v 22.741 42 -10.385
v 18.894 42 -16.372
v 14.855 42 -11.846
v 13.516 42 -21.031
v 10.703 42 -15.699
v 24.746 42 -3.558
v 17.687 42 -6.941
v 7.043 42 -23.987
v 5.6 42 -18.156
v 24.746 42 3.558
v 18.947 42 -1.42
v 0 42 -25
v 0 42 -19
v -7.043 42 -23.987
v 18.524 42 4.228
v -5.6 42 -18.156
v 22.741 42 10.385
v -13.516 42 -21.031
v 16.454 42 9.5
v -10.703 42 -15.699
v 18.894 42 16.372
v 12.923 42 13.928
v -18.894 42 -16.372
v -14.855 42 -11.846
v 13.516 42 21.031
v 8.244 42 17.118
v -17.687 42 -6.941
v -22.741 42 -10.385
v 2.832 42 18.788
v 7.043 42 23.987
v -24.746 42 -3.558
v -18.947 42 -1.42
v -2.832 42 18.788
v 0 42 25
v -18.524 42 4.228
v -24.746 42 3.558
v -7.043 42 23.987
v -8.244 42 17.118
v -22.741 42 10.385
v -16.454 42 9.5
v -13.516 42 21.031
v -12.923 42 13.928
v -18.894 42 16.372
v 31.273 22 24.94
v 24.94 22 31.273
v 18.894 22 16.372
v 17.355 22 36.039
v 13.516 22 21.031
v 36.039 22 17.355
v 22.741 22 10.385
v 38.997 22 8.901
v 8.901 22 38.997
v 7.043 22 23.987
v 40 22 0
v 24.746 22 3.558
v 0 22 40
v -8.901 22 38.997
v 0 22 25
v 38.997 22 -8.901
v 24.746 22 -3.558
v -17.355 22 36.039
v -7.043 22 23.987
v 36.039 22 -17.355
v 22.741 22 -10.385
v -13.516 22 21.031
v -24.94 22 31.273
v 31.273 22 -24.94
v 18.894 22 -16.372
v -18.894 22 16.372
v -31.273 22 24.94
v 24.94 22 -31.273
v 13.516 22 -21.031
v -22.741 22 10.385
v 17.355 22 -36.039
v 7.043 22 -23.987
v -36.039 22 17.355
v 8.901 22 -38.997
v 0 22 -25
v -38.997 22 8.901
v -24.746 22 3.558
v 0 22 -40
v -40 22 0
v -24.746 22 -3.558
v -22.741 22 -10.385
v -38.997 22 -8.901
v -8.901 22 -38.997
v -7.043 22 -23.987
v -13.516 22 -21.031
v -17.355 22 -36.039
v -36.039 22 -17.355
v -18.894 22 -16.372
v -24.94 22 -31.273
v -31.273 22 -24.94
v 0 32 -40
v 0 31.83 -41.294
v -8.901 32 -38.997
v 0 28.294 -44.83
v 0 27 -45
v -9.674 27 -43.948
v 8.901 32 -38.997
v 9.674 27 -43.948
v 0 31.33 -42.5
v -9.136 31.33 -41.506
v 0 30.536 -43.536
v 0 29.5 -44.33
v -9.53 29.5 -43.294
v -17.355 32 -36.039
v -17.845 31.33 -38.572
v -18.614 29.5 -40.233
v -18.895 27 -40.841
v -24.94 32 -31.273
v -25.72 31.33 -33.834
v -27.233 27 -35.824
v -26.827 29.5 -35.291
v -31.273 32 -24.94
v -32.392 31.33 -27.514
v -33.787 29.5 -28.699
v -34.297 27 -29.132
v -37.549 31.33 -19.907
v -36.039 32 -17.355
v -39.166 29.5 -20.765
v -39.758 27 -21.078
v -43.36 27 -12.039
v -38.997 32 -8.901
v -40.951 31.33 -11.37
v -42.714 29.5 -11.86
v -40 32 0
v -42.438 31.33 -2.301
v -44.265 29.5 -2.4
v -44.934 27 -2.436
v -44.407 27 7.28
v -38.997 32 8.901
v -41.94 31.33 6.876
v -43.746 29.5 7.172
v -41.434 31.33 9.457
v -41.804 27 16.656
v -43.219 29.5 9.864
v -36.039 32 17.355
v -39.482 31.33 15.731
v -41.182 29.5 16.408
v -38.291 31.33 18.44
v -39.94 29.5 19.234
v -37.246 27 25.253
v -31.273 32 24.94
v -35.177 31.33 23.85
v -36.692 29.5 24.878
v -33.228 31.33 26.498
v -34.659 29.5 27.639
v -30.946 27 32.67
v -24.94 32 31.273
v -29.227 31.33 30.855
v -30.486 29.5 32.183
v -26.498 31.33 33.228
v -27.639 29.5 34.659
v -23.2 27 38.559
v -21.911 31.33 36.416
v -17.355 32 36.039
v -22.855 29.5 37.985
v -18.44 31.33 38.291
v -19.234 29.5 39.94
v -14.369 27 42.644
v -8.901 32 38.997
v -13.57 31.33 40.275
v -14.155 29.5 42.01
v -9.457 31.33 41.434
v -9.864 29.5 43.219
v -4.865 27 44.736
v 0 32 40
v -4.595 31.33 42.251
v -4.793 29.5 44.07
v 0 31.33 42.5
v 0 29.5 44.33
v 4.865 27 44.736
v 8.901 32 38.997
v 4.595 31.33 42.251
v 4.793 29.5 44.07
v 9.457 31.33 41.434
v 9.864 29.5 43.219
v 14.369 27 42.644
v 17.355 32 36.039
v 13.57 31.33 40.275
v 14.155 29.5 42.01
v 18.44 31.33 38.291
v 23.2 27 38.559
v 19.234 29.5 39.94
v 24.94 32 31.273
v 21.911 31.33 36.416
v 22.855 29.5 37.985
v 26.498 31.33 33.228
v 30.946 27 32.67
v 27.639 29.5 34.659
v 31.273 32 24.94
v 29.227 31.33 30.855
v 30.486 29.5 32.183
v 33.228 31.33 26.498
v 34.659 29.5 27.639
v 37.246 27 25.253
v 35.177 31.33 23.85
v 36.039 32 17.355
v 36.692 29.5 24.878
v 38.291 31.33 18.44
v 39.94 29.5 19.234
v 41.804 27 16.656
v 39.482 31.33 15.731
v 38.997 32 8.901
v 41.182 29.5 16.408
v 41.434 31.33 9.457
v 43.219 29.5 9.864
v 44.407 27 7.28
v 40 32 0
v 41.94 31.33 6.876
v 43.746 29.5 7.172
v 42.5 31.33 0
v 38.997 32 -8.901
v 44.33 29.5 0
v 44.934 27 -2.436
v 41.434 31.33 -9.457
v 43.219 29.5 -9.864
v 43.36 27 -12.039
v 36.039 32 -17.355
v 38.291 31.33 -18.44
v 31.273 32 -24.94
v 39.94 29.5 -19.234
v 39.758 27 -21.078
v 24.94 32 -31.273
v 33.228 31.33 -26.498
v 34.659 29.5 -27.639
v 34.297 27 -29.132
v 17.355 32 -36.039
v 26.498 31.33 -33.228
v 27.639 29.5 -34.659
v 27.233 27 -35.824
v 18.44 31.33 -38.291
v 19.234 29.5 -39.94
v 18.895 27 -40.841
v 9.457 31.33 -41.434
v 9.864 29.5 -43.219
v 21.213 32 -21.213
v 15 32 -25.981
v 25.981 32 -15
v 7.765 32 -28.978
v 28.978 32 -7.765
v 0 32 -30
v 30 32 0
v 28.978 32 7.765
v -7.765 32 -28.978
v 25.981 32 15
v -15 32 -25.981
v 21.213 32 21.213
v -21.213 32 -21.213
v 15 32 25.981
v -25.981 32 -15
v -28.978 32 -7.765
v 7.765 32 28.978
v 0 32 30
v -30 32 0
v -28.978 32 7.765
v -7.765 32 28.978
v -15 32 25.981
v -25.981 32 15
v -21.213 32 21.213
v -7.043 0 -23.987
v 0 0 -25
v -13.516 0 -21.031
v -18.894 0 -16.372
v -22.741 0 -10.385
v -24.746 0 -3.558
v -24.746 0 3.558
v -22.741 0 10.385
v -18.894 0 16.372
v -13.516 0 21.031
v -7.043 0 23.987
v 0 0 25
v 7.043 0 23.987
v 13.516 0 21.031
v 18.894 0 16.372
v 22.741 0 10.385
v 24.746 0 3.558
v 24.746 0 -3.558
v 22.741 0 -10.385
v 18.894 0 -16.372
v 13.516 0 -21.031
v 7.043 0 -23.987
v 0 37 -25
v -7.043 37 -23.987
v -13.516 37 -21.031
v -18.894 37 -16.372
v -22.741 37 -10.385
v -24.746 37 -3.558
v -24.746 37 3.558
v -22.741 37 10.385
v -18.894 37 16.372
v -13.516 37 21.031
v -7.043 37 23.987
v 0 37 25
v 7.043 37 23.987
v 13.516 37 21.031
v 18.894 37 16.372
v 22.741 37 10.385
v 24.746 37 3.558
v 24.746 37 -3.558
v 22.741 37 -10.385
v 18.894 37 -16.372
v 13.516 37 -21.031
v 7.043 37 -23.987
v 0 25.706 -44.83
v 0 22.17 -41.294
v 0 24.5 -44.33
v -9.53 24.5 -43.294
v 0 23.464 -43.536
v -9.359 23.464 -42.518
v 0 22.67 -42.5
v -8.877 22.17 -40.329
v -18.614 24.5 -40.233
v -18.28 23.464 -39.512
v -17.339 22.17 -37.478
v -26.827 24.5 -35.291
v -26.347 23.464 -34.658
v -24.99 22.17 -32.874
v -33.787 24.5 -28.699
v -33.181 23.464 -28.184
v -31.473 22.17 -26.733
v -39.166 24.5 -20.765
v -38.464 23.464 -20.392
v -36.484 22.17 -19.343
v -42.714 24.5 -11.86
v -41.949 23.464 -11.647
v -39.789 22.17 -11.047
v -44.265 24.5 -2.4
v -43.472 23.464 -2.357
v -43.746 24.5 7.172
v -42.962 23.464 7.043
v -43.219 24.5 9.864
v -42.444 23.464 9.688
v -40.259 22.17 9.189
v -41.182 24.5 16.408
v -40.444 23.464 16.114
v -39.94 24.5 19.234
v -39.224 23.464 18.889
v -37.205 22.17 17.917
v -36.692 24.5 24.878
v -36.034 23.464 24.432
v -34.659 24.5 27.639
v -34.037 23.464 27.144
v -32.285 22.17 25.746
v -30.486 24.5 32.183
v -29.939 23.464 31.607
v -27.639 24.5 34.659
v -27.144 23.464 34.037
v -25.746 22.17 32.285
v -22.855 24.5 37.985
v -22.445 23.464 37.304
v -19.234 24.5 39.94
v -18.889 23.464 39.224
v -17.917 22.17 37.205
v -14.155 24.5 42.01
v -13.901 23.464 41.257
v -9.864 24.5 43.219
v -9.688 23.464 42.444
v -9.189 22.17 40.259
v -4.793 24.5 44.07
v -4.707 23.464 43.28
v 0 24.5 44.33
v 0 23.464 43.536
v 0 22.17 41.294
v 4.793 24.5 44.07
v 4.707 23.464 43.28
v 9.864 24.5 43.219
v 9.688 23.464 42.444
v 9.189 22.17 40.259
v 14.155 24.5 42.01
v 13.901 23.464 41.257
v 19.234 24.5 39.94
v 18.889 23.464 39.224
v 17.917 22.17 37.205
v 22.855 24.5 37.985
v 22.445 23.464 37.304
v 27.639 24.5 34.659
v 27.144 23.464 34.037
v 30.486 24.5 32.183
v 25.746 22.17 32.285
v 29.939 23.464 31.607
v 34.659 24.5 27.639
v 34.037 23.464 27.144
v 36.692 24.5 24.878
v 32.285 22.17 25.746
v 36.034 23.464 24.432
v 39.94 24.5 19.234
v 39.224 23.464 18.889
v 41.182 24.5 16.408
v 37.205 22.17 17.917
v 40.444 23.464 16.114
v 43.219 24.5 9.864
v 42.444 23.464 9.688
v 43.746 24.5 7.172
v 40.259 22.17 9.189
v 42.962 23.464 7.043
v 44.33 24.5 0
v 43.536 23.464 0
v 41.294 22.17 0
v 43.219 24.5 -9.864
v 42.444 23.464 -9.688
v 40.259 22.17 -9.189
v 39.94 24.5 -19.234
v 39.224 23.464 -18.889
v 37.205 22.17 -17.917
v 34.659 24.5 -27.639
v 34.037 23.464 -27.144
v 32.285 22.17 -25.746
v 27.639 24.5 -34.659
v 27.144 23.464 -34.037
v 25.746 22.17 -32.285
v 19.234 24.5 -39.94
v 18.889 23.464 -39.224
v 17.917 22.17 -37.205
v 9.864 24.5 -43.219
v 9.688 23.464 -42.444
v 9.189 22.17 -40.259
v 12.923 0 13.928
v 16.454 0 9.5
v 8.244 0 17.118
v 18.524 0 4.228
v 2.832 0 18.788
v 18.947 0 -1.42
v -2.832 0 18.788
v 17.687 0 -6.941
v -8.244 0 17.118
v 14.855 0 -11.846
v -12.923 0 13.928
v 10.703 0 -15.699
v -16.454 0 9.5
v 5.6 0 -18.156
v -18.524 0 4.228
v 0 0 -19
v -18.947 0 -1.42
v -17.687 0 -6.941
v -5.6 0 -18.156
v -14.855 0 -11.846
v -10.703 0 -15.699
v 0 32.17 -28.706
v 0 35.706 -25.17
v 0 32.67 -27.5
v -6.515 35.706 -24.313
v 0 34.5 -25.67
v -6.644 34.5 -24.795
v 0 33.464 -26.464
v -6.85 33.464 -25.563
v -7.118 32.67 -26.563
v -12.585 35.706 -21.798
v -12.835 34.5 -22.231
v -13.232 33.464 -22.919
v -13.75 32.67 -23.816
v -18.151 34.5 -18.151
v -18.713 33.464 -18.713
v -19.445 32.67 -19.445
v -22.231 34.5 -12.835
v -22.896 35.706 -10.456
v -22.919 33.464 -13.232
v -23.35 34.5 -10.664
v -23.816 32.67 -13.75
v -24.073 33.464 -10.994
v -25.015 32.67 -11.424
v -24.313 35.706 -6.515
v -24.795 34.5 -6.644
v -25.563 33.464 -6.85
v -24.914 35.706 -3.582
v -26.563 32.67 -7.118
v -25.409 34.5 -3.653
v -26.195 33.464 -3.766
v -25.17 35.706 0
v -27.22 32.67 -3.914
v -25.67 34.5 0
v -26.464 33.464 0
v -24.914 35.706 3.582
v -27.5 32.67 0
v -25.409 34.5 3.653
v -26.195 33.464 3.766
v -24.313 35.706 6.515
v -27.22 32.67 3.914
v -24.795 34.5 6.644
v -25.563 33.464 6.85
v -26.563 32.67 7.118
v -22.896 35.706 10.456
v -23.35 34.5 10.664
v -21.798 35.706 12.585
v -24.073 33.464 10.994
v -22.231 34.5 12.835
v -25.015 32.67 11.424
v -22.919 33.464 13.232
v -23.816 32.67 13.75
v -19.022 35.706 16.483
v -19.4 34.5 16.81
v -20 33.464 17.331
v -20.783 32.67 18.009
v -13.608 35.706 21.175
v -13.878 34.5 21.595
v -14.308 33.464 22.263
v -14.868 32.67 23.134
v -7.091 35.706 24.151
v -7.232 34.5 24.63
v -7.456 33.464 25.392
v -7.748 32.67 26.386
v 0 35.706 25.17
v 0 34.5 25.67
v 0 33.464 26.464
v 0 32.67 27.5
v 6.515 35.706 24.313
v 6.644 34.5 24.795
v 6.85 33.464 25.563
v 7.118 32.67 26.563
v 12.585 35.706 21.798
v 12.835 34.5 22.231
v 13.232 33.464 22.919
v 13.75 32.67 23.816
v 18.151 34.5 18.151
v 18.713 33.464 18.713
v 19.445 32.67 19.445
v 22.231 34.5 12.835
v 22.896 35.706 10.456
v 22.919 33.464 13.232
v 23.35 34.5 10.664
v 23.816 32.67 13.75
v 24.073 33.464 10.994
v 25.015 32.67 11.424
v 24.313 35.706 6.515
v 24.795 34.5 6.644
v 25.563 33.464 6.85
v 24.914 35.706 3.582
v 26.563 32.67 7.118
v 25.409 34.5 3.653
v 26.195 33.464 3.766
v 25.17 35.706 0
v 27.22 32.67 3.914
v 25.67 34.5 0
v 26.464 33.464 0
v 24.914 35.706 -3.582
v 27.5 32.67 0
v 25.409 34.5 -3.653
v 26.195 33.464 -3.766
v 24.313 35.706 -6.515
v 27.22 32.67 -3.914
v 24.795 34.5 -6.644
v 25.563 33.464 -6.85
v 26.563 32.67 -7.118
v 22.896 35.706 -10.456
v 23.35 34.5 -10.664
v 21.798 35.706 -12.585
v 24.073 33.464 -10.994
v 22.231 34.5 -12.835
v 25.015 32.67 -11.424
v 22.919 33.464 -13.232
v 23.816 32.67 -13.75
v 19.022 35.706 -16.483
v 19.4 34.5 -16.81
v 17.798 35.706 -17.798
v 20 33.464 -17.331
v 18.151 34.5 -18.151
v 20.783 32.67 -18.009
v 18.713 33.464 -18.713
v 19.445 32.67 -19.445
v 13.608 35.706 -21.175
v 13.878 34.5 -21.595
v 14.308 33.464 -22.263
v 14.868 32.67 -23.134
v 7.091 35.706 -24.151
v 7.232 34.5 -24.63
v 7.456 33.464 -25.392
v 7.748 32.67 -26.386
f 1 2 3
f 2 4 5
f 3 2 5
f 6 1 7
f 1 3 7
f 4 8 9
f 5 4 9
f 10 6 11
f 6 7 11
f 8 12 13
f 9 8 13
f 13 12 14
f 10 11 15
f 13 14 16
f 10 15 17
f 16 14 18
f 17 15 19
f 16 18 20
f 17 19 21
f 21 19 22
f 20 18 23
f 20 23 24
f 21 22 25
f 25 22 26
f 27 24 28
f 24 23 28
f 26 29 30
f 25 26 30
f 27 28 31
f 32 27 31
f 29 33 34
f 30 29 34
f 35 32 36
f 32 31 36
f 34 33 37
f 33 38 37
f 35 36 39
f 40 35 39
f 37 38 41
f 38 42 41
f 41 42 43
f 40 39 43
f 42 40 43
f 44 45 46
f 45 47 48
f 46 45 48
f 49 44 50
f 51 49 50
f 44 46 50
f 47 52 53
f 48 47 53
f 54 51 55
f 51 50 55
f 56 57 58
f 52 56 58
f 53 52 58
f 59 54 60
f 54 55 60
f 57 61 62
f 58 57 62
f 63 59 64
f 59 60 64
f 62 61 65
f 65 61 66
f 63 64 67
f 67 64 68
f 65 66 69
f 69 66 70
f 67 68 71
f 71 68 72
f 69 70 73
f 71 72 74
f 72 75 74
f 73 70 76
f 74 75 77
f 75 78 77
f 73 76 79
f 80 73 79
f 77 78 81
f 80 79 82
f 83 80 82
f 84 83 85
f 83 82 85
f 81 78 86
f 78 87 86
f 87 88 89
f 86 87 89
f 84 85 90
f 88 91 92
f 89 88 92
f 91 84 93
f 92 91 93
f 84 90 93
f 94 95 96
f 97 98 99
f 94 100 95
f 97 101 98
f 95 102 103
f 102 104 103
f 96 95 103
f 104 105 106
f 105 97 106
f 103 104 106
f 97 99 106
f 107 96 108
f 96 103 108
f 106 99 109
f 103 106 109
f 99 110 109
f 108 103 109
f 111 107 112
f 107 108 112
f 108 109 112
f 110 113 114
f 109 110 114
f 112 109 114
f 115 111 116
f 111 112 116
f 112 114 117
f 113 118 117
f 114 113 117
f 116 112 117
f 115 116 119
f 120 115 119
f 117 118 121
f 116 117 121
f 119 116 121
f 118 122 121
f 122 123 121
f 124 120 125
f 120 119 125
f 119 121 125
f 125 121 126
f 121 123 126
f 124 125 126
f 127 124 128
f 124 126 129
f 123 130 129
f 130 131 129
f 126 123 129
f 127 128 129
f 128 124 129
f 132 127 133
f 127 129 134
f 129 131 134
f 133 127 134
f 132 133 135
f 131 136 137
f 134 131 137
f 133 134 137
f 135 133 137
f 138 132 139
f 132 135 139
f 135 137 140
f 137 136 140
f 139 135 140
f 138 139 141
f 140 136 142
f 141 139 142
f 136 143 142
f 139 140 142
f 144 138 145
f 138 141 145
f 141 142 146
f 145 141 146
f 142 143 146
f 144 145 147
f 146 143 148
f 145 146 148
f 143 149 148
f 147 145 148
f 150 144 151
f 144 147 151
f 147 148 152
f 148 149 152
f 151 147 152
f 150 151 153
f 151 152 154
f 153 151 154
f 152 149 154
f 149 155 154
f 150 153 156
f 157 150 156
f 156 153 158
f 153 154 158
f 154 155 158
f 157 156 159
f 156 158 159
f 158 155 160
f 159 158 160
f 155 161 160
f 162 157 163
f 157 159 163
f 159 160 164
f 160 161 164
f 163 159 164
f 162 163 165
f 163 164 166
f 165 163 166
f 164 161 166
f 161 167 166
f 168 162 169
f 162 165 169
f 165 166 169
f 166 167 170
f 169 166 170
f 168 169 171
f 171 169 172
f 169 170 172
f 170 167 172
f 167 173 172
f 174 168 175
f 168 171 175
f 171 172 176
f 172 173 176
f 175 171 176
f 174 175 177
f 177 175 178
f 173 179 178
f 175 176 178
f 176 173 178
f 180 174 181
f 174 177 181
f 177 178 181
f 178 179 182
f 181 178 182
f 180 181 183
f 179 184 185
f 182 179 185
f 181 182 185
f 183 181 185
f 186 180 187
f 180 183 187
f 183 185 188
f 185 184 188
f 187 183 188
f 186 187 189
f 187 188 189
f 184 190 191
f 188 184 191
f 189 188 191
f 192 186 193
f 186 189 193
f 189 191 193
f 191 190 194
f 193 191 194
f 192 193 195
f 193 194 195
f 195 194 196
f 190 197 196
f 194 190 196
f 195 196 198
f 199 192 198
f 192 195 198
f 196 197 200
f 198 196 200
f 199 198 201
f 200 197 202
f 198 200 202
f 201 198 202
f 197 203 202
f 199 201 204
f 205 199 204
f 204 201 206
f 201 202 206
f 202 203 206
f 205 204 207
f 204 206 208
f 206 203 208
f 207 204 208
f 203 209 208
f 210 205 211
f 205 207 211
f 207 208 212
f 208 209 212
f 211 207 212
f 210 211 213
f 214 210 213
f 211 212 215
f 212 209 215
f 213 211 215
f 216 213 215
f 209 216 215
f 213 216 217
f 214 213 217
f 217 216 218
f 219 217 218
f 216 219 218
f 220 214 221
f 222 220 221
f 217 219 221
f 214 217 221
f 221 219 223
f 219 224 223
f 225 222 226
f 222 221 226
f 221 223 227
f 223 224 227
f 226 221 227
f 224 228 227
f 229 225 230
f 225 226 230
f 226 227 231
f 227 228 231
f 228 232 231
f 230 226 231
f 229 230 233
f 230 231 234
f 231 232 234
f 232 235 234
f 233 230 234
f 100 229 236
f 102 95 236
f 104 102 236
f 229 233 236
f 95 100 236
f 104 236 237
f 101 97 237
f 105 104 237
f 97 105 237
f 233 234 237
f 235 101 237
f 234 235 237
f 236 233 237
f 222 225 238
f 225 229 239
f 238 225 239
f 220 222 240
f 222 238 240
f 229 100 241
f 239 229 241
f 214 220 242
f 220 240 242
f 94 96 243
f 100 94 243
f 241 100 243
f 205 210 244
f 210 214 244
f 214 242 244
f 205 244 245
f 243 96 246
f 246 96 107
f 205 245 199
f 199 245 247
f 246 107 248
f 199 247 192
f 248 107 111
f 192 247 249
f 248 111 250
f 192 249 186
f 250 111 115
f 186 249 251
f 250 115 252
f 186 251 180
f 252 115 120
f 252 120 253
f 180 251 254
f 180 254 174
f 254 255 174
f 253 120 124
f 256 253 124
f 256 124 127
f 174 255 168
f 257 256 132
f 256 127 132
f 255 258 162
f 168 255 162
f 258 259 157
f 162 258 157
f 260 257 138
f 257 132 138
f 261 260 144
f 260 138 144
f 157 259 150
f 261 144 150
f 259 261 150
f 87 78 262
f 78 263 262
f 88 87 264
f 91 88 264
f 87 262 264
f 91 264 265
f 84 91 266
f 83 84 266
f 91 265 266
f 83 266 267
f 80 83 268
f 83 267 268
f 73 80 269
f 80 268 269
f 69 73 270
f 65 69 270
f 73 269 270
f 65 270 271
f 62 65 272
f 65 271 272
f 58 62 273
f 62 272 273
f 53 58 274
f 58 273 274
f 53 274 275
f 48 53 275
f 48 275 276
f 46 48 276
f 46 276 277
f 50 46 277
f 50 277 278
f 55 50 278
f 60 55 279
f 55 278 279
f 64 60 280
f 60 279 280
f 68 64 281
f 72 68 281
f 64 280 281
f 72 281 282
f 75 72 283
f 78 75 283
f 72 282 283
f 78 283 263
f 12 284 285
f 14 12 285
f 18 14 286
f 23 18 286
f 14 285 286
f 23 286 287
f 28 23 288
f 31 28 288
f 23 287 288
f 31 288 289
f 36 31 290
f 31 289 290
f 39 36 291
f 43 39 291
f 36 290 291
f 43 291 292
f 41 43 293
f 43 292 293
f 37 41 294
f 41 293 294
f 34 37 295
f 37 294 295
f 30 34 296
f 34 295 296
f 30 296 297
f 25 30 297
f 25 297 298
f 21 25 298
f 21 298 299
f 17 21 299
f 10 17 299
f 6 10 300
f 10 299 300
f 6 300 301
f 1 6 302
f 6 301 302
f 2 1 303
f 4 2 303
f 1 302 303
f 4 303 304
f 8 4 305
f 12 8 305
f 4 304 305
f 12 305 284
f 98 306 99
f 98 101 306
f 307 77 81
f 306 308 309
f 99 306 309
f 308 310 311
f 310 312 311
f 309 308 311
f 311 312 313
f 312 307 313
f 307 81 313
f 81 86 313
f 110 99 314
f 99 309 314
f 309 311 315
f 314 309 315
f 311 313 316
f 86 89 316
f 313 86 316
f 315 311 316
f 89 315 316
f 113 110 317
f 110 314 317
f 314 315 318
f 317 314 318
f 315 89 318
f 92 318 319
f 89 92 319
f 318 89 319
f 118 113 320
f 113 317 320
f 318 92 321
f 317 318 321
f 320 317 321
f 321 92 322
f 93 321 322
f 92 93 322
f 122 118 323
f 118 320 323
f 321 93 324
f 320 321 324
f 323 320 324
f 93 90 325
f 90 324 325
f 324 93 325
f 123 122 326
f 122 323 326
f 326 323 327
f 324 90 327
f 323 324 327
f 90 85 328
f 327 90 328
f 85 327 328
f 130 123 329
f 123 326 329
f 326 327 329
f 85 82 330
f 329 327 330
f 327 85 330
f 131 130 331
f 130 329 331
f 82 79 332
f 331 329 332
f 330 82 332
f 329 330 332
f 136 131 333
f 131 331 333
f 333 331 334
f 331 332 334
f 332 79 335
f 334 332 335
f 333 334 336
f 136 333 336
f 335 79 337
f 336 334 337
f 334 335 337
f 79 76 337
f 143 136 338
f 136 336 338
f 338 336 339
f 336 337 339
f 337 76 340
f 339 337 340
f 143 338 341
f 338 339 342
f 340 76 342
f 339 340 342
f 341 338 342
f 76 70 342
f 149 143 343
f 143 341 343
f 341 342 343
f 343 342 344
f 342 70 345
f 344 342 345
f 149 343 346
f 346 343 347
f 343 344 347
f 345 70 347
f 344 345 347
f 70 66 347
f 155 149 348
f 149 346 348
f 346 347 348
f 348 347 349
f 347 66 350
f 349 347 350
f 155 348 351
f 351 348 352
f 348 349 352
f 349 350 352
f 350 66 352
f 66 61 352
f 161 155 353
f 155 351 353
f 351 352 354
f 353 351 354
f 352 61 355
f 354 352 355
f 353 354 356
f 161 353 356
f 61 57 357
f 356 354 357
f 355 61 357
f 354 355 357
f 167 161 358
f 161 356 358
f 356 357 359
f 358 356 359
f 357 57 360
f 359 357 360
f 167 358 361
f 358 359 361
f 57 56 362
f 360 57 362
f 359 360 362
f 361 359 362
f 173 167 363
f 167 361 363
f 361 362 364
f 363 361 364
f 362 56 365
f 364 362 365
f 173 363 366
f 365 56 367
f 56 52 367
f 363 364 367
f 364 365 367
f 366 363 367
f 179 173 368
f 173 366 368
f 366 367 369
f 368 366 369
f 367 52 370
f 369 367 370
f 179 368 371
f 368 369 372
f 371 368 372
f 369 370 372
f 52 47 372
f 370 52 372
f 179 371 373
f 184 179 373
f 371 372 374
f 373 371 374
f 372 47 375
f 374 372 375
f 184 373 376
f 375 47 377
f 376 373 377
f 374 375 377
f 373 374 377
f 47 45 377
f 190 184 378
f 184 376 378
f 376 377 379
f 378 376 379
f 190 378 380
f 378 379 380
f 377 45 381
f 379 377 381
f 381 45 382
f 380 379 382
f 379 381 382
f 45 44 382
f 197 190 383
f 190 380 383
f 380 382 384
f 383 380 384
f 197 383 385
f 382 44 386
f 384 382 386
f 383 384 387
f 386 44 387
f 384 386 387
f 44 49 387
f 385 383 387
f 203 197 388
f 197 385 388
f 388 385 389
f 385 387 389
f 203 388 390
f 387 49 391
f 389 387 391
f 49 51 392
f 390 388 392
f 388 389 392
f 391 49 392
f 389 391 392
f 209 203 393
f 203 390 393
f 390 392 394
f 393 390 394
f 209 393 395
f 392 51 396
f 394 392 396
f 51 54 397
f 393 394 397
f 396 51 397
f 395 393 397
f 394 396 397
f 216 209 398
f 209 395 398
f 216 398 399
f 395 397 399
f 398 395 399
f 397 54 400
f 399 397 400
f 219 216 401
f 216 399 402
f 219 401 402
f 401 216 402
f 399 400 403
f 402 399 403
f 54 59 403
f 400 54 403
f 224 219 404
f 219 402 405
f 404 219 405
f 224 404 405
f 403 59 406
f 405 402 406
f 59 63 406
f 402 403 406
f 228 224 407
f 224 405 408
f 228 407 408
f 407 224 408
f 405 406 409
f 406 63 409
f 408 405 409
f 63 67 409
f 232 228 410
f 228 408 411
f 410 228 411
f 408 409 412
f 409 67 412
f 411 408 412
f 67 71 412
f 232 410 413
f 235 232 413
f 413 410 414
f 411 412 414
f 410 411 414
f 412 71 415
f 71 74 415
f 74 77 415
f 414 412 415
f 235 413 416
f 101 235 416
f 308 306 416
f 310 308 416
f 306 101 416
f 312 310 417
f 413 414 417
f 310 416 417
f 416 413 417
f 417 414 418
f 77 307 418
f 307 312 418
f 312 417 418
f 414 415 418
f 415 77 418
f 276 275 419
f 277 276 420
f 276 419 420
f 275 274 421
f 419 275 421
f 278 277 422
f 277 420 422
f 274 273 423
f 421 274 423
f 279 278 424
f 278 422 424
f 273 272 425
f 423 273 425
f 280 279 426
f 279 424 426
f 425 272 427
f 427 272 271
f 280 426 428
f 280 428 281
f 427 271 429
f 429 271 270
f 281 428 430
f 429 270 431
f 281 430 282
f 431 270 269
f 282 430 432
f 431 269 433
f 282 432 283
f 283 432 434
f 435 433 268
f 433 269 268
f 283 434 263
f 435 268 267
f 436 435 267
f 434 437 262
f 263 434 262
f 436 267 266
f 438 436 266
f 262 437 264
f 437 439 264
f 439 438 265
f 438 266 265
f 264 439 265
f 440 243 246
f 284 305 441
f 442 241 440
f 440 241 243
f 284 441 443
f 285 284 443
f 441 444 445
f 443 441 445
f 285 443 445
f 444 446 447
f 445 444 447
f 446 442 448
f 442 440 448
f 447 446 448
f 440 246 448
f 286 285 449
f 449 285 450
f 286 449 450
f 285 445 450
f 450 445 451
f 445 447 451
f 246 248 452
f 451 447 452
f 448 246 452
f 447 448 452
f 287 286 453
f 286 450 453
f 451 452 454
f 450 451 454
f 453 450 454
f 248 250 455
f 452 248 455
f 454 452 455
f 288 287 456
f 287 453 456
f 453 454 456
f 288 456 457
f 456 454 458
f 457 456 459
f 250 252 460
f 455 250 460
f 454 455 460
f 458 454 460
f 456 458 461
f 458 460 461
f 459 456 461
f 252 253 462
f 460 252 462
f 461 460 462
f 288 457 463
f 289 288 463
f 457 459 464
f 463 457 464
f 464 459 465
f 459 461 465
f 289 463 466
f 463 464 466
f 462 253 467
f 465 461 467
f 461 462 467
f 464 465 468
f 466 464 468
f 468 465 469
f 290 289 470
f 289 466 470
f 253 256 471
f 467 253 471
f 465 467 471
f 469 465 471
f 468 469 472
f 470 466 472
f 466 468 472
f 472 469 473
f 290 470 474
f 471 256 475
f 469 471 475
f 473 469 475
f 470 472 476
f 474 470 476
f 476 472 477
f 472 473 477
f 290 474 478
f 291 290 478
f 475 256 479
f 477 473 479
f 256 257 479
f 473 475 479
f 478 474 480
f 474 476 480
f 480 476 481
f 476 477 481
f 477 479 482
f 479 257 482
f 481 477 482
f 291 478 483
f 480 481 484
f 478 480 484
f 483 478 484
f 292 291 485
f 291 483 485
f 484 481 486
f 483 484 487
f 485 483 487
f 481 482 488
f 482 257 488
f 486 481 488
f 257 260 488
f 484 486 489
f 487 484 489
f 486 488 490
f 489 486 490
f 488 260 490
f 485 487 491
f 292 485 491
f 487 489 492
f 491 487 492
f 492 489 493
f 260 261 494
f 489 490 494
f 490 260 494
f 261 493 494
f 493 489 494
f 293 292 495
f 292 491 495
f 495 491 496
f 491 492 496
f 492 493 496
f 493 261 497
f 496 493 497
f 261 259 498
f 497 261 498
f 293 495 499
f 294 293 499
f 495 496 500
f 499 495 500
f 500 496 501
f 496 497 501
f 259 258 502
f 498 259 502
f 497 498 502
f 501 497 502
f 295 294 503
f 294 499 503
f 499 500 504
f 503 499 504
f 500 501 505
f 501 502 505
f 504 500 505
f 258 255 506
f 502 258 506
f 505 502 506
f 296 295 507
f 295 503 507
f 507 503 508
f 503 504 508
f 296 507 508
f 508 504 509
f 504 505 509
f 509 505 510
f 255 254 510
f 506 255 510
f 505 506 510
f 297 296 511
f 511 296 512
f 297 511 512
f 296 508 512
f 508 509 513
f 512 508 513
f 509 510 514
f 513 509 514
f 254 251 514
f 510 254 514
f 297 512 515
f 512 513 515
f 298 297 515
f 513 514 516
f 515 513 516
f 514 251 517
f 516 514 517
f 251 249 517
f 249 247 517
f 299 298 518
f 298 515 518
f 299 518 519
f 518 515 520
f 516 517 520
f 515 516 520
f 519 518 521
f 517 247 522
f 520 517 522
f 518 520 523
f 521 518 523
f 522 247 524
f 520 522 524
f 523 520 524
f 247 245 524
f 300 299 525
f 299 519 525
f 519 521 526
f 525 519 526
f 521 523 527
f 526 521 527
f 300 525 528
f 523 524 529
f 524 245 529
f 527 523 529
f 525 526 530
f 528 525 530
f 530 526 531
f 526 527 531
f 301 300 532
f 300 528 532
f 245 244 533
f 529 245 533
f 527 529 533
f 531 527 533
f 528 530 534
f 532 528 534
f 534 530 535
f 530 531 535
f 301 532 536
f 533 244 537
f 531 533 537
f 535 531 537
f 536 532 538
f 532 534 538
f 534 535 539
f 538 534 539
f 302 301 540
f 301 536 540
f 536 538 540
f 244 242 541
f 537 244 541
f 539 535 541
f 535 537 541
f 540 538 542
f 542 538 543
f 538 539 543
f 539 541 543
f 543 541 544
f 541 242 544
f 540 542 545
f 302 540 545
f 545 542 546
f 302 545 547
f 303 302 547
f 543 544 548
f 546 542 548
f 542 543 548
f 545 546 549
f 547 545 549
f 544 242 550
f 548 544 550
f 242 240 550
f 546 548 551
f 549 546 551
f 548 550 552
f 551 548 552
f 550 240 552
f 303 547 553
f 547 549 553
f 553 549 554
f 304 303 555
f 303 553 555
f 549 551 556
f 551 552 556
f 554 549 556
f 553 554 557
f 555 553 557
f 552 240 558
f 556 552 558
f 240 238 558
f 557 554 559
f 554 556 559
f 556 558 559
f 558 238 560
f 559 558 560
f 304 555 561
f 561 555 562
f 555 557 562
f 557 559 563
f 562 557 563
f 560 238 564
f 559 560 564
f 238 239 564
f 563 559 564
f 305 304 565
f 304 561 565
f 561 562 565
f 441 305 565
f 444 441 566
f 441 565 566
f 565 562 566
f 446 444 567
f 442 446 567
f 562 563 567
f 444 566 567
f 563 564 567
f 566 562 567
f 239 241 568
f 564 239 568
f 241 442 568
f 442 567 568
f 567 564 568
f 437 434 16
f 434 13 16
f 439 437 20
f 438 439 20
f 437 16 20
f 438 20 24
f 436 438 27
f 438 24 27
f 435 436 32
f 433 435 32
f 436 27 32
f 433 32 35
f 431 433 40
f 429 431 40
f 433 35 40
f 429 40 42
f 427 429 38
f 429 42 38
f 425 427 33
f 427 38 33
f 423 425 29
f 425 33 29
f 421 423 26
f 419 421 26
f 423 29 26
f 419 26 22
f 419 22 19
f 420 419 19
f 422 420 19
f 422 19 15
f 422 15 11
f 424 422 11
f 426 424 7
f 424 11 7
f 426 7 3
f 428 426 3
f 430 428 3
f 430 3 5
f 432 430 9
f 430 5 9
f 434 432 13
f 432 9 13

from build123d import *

# Parameters (mm, degrees)
FILLET1_R = 5


with BuildPart() as part:
    # Sketch1 → Revolve1 (revolve)
    with BuildSketch(Plane.XY, mode=Mode.PRIVATE) as revolve1_sk:
        Polygon((19, 0), (19, 42), (25, 42), (25, 32), (45, 32), (45, 22), (25, 22), (25, 0), align=None)
    revolve(revolve1_sk.sketch.rotate(Axis((0, 0, 0), (0, 1, 0)), 90), axis=Axis((0, 0, 0), (0, 1, 0)))

    # Fillet1
    fillet1_edges = [part.edges().sort_by_distance(p)[0] for p in [
        (0, 22, 45),
        (0, 32, 45),
        (0, 32, 25),
    ]]
    fillet(fillet1_edges, radius=FILLET1_R - 0.0001)  # a hair under: the kernel refuses the full size


solid = part.part
